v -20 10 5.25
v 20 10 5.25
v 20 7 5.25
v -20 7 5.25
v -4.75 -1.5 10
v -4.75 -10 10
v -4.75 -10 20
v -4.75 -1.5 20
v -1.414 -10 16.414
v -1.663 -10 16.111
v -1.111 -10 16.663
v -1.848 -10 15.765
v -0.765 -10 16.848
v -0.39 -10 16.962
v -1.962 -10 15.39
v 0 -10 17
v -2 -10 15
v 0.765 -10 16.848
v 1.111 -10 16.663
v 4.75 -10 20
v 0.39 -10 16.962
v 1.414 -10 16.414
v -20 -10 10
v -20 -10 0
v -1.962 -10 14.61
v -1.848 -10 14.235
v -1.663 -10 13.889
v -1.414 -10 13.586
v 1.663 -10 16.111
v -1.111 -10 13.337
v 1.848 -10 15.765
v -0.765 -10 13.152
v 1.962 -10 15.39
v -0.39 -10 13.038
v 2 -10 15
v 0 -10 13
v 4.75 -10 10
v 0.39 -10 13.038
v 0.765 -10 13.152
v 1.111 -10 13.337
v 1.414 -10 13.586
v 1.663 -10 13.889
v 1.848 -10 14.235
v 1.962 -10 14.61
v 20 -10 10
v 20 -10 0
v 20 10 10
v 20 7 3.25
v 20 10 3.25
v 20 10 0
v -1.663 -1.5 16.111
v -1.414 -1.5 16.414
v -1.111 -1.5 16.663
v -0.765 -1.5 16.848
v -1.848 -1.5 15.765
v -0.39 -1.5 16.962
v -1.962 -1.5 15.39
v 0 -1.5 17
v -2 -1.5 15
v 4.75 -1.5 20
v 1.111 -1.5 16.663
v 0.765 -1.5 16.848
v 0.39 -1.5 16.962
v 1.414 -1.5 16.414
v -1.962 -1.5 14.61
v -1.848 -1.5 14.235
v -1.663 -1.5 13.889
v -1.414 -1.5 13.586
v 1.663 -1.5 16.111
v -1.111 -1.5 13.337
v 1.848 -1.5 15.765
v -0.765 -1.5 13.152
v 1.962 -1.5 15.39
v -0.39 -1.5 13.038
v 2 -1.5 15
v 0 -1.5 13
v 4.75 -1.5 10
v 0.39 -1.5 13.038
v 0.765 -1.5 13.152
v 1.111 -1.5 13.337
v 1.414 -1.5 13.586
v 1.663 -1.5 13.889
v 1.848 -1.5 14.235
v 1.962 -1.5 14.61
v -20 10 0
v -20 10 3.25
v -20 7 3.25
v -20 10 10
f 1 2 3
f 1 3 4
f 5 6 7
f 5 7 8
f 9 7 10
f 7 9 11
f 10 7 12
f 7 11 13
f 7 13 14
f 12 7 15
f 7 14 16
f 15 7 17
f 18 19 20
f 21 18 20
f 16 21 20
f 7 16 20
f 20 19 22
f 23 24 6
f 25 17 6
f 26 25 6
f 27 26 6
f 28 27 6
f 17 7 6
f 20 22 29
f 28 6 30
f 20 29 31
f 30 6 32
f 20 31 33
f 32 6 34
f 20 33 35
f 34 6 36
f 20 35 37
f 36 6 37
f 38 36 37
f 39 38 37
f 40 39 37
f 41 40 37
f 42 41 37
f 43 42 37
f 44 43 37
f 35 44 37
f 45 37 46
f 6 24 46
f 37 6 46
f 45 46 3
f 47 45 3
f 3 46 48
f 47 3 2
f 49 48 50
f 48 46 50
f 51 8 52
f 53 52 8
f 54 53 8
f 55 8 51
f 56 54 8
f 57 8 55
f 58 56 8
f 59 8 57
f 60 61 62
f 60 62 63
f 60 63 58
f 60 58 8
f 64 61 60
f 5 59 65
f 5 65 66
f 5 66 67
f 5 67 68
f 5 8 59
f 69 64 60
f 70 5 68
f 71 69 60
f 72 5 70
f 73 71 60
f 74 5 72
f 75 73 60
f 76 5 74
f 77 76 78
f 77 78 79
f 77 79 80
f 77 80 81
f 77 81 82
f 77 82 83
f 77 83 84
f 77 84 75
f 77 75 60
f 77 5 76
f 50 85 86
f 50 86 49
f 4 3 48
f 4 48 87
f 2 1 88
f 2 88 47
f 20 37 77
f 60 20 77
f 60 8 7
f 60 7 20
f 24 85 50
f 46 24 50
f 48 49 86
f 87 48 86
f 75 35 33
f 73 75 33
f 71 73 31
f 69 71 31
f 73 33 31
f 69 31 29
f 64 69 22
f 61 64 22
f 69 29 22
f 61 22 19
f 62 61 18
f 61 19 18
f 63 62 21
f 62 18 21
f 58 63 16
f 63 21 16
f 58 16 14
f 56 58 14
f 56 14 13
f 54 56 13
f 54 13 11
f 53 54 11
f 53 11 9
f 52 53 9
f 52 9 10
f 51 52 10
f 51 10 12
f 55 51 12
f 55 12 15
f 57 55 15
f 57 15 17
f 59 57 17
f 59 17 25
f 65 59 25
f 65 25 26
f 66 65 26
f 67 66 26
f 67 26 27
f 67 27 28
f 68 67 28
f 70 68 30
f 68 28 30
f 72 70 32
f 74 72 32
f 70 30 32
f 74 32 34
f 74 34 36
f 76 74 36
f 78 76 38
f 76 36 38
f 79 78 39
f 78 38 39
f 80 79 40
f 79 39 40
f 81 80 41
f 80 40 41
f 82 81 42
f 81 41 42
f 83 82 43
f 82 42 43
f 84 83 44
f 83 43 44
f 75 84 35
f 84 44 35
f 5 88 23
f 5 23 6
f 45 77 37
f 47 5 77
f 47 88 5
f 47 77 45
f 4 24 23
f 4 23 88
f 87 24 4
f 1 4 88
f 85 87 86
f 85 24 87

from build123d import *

# Parameters (mm, degrees)
F0_W     = 40
F0_H     = 20
F1_DEPTH = 10
F2_W     = 9.5
F2_H     = 8.5
F3_DEPTH = 10
F4_R     = 2
F5_DEPTH = 10
F6_W     = 40
F6_H     = 2
F7_DEPTH = 3


with BuildPart() as f1:
    # F0 (on Top) → F1 (new body)
    with BuildSketch(Plane.XY):
        Rectangle(F0_W, F0_H)
    extrude(amount=F1_DEPTH)

    # F2 (on face) → F3 (join)
    with BuildSketch(Plane.XY.offset(10)):
        with Locations((0, -5.75)):
            Rectangle(F2_W, F2_H)
    extrude(amount=F3_DEPTH)

    # F4 (on face) → F5 (cut)
    with BuildSketch(Plane.XZ.offset(10)):
        with Locations((0, 15)):
            Circle(F4_R)
    extrude(amount=-F5_DEPTH, mode=Mode.SUBTRACT)

    # F6 (on face) → F7 (cut)
    with BuildSketch(Plane(origin=(0, 10, 0), x_dir=(-1, 0, 0), z_dir=(0, 1, 0))):
        with Locations((0, 4.25)):
            Rectangle(F6_W, F6_H)
    extrude(amount=-F7_DEPTH, mode=Mode.SUBTRACT)


solid = f1.part
